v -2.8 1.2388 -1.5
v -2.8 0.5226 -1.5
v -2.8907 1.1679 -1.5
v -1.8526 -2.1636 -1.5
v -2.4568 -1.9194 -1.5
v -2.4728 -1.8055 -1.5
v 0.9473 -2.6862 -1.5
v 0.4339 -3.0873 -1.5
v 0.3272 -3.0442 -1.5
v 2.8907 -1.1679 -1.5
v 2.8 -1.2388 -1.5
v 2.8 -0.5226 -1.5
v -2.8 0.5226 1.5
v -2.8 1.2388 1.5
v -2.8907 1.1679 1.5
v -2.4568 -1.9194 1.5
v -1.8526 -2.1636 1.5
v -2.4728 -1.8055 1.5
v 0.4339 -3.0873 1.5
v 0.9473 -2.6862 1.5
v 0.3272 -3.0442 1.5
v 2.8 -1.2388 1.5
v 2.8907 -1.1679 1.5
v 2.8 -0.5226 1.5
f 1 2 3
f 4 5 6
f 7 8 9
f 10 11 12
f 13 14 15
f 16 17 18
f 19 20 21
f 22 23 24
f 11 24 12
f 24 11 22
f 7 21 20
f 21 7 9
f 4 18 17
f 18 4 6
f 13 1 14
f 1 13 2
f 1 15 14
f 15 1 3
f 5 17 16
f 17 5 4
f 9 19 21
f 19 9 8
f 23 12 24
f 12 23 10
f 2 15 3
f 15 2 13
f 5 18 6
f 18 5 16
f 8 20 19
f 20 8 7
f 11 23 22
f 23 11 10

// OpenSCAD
// file: ../spanner.scad
// ============================================================
//  Nut spanner: flat, double-ended open spanner for the M3 nylocks on
//  the adjust screws (hold the nylock, turn the screw head).
//  End 0: mouth 15 deg off the handle (X nylock, from above).
//  End 1: mouth 90 deg to the handle (Z nylock, from the side).
//  Lies flat on z = 0..spanner_t, end 0's nut centre at the origin,
//  handle along +X.
// ============================================================
include <lib.scad>

spanner_af = lock_nut_af + 0.2; // same tight fit as the nut pockets
spanner_t = 3; // fits the 4 mm nylock with room to spare
spanner_jaw = 3; // jaw wall
spanner_tip = 2.4; // jaw tips past the nut centre
spanner_len = 75; // end centre to end centre
spanner_w = 8; // handle width
spanner_mouth = [165, 90]; // mouth direction per end, from the handle (+X)
spanner_label = "5.5mm"; // nominal spanner size (M3 nut)
spanner_label_depth = 0.6; // recessed into the top face

_sp_corner = spanner_af / cos(30) / 2; // hex throat: flats on the jaw faces
_sp_back = _sp_corner + spanner_jaw; // nut centre to the back of the head

function spanner_centre(e) = e == 0 ? [0, 0] : [spanner_len, 0];
// end 1's mouth points -Y, so its handle runs away toward -X when posed
function spanner_dir(e) = e == 0 ? spanner_mouth[0] : 360 - spanner_mouth[1];

// head outline / slot, mouth along +Y, nut centre at the origin
module spanner_head_2d() {
    hw = spanner_af / 2 + spanner_jaw;
    offset(r = 1.5) offset(delta = -1.5)
        translate([-hw, -_sp_back]) square([2 * hw, _sp_back + spanner_tip]);
}
module spanner_slot_2d() {
    translate([-spanner_af / 2, 0]) square([spanner_af, spanner_tip + 1]);
    rotate(90) circle(r = _sp_corner, $fn = 6); // flats on the jaws
}

// handle ends sit behind each head so they never reach past the jaw tips
_sp_handle = [[6, 0], [spanner_len - 6, 2]];

// size label along the handle's centre line
module spanner_label_2d() {
    a = _sp_handle[0]; b = _sp_handle[1];
    translate((a + b) / 2) rotate(atan2(b[1] - a[1], b[0] - a[0]))
        text(spanner_label, size = 4.5, font = "Liberation Sans:style=Bold", halign = "center", valign = "center");
}

module nut_spanner() {
    difference() {
        spanner_body();
        translate([0, 0, spanner_t - spanner_label_depth]) linear_extrude(spanner_label_depth + 1) spanner_label_2d();
    }
}

module spanner_body() {
    linear_extrude(spanner_t) difference() {
        union() {
            for (e = [0, 1]) translate(spanner_centre(e)) rotate(spanner_dir(e) - 90) spanner_head_2d();
            hull() for (p = _sp_handle) translate(p) circle(d = spanner_w, $fn = 32);
        }
        for (e = [0, 1]) translate(spanner_centre(e)) rotate(spanner_dir(e) - 90) spanner_slot_2d();
    }
}

// Spanner placed with end e's nut centre at the origin, its mouth along
// +Y and its thickness centred on z = 0 (for fit and reach checks).
module spanner_at(e) {
    rotate(90 - spanner_dir(e)) translate([-spanner_centre(e)[0], -spanner_centre(e)[1], -spanner_t / 2])
        nut_spanner();
}
// main file
// The spanner's 15 deg end must grip: a real nut (5.4 AF) turned 8 deg in
// the jaw must hit it. Must render NON-empty.
include <../spanner.scad>
af = 5.4;
intersection() {
  spanner_at(0);
  rotate([0, 0, 90 + 8]) cylinder(d = af / cos(30), h = spanner_t + 2, center = true, $fn = 6);
}
